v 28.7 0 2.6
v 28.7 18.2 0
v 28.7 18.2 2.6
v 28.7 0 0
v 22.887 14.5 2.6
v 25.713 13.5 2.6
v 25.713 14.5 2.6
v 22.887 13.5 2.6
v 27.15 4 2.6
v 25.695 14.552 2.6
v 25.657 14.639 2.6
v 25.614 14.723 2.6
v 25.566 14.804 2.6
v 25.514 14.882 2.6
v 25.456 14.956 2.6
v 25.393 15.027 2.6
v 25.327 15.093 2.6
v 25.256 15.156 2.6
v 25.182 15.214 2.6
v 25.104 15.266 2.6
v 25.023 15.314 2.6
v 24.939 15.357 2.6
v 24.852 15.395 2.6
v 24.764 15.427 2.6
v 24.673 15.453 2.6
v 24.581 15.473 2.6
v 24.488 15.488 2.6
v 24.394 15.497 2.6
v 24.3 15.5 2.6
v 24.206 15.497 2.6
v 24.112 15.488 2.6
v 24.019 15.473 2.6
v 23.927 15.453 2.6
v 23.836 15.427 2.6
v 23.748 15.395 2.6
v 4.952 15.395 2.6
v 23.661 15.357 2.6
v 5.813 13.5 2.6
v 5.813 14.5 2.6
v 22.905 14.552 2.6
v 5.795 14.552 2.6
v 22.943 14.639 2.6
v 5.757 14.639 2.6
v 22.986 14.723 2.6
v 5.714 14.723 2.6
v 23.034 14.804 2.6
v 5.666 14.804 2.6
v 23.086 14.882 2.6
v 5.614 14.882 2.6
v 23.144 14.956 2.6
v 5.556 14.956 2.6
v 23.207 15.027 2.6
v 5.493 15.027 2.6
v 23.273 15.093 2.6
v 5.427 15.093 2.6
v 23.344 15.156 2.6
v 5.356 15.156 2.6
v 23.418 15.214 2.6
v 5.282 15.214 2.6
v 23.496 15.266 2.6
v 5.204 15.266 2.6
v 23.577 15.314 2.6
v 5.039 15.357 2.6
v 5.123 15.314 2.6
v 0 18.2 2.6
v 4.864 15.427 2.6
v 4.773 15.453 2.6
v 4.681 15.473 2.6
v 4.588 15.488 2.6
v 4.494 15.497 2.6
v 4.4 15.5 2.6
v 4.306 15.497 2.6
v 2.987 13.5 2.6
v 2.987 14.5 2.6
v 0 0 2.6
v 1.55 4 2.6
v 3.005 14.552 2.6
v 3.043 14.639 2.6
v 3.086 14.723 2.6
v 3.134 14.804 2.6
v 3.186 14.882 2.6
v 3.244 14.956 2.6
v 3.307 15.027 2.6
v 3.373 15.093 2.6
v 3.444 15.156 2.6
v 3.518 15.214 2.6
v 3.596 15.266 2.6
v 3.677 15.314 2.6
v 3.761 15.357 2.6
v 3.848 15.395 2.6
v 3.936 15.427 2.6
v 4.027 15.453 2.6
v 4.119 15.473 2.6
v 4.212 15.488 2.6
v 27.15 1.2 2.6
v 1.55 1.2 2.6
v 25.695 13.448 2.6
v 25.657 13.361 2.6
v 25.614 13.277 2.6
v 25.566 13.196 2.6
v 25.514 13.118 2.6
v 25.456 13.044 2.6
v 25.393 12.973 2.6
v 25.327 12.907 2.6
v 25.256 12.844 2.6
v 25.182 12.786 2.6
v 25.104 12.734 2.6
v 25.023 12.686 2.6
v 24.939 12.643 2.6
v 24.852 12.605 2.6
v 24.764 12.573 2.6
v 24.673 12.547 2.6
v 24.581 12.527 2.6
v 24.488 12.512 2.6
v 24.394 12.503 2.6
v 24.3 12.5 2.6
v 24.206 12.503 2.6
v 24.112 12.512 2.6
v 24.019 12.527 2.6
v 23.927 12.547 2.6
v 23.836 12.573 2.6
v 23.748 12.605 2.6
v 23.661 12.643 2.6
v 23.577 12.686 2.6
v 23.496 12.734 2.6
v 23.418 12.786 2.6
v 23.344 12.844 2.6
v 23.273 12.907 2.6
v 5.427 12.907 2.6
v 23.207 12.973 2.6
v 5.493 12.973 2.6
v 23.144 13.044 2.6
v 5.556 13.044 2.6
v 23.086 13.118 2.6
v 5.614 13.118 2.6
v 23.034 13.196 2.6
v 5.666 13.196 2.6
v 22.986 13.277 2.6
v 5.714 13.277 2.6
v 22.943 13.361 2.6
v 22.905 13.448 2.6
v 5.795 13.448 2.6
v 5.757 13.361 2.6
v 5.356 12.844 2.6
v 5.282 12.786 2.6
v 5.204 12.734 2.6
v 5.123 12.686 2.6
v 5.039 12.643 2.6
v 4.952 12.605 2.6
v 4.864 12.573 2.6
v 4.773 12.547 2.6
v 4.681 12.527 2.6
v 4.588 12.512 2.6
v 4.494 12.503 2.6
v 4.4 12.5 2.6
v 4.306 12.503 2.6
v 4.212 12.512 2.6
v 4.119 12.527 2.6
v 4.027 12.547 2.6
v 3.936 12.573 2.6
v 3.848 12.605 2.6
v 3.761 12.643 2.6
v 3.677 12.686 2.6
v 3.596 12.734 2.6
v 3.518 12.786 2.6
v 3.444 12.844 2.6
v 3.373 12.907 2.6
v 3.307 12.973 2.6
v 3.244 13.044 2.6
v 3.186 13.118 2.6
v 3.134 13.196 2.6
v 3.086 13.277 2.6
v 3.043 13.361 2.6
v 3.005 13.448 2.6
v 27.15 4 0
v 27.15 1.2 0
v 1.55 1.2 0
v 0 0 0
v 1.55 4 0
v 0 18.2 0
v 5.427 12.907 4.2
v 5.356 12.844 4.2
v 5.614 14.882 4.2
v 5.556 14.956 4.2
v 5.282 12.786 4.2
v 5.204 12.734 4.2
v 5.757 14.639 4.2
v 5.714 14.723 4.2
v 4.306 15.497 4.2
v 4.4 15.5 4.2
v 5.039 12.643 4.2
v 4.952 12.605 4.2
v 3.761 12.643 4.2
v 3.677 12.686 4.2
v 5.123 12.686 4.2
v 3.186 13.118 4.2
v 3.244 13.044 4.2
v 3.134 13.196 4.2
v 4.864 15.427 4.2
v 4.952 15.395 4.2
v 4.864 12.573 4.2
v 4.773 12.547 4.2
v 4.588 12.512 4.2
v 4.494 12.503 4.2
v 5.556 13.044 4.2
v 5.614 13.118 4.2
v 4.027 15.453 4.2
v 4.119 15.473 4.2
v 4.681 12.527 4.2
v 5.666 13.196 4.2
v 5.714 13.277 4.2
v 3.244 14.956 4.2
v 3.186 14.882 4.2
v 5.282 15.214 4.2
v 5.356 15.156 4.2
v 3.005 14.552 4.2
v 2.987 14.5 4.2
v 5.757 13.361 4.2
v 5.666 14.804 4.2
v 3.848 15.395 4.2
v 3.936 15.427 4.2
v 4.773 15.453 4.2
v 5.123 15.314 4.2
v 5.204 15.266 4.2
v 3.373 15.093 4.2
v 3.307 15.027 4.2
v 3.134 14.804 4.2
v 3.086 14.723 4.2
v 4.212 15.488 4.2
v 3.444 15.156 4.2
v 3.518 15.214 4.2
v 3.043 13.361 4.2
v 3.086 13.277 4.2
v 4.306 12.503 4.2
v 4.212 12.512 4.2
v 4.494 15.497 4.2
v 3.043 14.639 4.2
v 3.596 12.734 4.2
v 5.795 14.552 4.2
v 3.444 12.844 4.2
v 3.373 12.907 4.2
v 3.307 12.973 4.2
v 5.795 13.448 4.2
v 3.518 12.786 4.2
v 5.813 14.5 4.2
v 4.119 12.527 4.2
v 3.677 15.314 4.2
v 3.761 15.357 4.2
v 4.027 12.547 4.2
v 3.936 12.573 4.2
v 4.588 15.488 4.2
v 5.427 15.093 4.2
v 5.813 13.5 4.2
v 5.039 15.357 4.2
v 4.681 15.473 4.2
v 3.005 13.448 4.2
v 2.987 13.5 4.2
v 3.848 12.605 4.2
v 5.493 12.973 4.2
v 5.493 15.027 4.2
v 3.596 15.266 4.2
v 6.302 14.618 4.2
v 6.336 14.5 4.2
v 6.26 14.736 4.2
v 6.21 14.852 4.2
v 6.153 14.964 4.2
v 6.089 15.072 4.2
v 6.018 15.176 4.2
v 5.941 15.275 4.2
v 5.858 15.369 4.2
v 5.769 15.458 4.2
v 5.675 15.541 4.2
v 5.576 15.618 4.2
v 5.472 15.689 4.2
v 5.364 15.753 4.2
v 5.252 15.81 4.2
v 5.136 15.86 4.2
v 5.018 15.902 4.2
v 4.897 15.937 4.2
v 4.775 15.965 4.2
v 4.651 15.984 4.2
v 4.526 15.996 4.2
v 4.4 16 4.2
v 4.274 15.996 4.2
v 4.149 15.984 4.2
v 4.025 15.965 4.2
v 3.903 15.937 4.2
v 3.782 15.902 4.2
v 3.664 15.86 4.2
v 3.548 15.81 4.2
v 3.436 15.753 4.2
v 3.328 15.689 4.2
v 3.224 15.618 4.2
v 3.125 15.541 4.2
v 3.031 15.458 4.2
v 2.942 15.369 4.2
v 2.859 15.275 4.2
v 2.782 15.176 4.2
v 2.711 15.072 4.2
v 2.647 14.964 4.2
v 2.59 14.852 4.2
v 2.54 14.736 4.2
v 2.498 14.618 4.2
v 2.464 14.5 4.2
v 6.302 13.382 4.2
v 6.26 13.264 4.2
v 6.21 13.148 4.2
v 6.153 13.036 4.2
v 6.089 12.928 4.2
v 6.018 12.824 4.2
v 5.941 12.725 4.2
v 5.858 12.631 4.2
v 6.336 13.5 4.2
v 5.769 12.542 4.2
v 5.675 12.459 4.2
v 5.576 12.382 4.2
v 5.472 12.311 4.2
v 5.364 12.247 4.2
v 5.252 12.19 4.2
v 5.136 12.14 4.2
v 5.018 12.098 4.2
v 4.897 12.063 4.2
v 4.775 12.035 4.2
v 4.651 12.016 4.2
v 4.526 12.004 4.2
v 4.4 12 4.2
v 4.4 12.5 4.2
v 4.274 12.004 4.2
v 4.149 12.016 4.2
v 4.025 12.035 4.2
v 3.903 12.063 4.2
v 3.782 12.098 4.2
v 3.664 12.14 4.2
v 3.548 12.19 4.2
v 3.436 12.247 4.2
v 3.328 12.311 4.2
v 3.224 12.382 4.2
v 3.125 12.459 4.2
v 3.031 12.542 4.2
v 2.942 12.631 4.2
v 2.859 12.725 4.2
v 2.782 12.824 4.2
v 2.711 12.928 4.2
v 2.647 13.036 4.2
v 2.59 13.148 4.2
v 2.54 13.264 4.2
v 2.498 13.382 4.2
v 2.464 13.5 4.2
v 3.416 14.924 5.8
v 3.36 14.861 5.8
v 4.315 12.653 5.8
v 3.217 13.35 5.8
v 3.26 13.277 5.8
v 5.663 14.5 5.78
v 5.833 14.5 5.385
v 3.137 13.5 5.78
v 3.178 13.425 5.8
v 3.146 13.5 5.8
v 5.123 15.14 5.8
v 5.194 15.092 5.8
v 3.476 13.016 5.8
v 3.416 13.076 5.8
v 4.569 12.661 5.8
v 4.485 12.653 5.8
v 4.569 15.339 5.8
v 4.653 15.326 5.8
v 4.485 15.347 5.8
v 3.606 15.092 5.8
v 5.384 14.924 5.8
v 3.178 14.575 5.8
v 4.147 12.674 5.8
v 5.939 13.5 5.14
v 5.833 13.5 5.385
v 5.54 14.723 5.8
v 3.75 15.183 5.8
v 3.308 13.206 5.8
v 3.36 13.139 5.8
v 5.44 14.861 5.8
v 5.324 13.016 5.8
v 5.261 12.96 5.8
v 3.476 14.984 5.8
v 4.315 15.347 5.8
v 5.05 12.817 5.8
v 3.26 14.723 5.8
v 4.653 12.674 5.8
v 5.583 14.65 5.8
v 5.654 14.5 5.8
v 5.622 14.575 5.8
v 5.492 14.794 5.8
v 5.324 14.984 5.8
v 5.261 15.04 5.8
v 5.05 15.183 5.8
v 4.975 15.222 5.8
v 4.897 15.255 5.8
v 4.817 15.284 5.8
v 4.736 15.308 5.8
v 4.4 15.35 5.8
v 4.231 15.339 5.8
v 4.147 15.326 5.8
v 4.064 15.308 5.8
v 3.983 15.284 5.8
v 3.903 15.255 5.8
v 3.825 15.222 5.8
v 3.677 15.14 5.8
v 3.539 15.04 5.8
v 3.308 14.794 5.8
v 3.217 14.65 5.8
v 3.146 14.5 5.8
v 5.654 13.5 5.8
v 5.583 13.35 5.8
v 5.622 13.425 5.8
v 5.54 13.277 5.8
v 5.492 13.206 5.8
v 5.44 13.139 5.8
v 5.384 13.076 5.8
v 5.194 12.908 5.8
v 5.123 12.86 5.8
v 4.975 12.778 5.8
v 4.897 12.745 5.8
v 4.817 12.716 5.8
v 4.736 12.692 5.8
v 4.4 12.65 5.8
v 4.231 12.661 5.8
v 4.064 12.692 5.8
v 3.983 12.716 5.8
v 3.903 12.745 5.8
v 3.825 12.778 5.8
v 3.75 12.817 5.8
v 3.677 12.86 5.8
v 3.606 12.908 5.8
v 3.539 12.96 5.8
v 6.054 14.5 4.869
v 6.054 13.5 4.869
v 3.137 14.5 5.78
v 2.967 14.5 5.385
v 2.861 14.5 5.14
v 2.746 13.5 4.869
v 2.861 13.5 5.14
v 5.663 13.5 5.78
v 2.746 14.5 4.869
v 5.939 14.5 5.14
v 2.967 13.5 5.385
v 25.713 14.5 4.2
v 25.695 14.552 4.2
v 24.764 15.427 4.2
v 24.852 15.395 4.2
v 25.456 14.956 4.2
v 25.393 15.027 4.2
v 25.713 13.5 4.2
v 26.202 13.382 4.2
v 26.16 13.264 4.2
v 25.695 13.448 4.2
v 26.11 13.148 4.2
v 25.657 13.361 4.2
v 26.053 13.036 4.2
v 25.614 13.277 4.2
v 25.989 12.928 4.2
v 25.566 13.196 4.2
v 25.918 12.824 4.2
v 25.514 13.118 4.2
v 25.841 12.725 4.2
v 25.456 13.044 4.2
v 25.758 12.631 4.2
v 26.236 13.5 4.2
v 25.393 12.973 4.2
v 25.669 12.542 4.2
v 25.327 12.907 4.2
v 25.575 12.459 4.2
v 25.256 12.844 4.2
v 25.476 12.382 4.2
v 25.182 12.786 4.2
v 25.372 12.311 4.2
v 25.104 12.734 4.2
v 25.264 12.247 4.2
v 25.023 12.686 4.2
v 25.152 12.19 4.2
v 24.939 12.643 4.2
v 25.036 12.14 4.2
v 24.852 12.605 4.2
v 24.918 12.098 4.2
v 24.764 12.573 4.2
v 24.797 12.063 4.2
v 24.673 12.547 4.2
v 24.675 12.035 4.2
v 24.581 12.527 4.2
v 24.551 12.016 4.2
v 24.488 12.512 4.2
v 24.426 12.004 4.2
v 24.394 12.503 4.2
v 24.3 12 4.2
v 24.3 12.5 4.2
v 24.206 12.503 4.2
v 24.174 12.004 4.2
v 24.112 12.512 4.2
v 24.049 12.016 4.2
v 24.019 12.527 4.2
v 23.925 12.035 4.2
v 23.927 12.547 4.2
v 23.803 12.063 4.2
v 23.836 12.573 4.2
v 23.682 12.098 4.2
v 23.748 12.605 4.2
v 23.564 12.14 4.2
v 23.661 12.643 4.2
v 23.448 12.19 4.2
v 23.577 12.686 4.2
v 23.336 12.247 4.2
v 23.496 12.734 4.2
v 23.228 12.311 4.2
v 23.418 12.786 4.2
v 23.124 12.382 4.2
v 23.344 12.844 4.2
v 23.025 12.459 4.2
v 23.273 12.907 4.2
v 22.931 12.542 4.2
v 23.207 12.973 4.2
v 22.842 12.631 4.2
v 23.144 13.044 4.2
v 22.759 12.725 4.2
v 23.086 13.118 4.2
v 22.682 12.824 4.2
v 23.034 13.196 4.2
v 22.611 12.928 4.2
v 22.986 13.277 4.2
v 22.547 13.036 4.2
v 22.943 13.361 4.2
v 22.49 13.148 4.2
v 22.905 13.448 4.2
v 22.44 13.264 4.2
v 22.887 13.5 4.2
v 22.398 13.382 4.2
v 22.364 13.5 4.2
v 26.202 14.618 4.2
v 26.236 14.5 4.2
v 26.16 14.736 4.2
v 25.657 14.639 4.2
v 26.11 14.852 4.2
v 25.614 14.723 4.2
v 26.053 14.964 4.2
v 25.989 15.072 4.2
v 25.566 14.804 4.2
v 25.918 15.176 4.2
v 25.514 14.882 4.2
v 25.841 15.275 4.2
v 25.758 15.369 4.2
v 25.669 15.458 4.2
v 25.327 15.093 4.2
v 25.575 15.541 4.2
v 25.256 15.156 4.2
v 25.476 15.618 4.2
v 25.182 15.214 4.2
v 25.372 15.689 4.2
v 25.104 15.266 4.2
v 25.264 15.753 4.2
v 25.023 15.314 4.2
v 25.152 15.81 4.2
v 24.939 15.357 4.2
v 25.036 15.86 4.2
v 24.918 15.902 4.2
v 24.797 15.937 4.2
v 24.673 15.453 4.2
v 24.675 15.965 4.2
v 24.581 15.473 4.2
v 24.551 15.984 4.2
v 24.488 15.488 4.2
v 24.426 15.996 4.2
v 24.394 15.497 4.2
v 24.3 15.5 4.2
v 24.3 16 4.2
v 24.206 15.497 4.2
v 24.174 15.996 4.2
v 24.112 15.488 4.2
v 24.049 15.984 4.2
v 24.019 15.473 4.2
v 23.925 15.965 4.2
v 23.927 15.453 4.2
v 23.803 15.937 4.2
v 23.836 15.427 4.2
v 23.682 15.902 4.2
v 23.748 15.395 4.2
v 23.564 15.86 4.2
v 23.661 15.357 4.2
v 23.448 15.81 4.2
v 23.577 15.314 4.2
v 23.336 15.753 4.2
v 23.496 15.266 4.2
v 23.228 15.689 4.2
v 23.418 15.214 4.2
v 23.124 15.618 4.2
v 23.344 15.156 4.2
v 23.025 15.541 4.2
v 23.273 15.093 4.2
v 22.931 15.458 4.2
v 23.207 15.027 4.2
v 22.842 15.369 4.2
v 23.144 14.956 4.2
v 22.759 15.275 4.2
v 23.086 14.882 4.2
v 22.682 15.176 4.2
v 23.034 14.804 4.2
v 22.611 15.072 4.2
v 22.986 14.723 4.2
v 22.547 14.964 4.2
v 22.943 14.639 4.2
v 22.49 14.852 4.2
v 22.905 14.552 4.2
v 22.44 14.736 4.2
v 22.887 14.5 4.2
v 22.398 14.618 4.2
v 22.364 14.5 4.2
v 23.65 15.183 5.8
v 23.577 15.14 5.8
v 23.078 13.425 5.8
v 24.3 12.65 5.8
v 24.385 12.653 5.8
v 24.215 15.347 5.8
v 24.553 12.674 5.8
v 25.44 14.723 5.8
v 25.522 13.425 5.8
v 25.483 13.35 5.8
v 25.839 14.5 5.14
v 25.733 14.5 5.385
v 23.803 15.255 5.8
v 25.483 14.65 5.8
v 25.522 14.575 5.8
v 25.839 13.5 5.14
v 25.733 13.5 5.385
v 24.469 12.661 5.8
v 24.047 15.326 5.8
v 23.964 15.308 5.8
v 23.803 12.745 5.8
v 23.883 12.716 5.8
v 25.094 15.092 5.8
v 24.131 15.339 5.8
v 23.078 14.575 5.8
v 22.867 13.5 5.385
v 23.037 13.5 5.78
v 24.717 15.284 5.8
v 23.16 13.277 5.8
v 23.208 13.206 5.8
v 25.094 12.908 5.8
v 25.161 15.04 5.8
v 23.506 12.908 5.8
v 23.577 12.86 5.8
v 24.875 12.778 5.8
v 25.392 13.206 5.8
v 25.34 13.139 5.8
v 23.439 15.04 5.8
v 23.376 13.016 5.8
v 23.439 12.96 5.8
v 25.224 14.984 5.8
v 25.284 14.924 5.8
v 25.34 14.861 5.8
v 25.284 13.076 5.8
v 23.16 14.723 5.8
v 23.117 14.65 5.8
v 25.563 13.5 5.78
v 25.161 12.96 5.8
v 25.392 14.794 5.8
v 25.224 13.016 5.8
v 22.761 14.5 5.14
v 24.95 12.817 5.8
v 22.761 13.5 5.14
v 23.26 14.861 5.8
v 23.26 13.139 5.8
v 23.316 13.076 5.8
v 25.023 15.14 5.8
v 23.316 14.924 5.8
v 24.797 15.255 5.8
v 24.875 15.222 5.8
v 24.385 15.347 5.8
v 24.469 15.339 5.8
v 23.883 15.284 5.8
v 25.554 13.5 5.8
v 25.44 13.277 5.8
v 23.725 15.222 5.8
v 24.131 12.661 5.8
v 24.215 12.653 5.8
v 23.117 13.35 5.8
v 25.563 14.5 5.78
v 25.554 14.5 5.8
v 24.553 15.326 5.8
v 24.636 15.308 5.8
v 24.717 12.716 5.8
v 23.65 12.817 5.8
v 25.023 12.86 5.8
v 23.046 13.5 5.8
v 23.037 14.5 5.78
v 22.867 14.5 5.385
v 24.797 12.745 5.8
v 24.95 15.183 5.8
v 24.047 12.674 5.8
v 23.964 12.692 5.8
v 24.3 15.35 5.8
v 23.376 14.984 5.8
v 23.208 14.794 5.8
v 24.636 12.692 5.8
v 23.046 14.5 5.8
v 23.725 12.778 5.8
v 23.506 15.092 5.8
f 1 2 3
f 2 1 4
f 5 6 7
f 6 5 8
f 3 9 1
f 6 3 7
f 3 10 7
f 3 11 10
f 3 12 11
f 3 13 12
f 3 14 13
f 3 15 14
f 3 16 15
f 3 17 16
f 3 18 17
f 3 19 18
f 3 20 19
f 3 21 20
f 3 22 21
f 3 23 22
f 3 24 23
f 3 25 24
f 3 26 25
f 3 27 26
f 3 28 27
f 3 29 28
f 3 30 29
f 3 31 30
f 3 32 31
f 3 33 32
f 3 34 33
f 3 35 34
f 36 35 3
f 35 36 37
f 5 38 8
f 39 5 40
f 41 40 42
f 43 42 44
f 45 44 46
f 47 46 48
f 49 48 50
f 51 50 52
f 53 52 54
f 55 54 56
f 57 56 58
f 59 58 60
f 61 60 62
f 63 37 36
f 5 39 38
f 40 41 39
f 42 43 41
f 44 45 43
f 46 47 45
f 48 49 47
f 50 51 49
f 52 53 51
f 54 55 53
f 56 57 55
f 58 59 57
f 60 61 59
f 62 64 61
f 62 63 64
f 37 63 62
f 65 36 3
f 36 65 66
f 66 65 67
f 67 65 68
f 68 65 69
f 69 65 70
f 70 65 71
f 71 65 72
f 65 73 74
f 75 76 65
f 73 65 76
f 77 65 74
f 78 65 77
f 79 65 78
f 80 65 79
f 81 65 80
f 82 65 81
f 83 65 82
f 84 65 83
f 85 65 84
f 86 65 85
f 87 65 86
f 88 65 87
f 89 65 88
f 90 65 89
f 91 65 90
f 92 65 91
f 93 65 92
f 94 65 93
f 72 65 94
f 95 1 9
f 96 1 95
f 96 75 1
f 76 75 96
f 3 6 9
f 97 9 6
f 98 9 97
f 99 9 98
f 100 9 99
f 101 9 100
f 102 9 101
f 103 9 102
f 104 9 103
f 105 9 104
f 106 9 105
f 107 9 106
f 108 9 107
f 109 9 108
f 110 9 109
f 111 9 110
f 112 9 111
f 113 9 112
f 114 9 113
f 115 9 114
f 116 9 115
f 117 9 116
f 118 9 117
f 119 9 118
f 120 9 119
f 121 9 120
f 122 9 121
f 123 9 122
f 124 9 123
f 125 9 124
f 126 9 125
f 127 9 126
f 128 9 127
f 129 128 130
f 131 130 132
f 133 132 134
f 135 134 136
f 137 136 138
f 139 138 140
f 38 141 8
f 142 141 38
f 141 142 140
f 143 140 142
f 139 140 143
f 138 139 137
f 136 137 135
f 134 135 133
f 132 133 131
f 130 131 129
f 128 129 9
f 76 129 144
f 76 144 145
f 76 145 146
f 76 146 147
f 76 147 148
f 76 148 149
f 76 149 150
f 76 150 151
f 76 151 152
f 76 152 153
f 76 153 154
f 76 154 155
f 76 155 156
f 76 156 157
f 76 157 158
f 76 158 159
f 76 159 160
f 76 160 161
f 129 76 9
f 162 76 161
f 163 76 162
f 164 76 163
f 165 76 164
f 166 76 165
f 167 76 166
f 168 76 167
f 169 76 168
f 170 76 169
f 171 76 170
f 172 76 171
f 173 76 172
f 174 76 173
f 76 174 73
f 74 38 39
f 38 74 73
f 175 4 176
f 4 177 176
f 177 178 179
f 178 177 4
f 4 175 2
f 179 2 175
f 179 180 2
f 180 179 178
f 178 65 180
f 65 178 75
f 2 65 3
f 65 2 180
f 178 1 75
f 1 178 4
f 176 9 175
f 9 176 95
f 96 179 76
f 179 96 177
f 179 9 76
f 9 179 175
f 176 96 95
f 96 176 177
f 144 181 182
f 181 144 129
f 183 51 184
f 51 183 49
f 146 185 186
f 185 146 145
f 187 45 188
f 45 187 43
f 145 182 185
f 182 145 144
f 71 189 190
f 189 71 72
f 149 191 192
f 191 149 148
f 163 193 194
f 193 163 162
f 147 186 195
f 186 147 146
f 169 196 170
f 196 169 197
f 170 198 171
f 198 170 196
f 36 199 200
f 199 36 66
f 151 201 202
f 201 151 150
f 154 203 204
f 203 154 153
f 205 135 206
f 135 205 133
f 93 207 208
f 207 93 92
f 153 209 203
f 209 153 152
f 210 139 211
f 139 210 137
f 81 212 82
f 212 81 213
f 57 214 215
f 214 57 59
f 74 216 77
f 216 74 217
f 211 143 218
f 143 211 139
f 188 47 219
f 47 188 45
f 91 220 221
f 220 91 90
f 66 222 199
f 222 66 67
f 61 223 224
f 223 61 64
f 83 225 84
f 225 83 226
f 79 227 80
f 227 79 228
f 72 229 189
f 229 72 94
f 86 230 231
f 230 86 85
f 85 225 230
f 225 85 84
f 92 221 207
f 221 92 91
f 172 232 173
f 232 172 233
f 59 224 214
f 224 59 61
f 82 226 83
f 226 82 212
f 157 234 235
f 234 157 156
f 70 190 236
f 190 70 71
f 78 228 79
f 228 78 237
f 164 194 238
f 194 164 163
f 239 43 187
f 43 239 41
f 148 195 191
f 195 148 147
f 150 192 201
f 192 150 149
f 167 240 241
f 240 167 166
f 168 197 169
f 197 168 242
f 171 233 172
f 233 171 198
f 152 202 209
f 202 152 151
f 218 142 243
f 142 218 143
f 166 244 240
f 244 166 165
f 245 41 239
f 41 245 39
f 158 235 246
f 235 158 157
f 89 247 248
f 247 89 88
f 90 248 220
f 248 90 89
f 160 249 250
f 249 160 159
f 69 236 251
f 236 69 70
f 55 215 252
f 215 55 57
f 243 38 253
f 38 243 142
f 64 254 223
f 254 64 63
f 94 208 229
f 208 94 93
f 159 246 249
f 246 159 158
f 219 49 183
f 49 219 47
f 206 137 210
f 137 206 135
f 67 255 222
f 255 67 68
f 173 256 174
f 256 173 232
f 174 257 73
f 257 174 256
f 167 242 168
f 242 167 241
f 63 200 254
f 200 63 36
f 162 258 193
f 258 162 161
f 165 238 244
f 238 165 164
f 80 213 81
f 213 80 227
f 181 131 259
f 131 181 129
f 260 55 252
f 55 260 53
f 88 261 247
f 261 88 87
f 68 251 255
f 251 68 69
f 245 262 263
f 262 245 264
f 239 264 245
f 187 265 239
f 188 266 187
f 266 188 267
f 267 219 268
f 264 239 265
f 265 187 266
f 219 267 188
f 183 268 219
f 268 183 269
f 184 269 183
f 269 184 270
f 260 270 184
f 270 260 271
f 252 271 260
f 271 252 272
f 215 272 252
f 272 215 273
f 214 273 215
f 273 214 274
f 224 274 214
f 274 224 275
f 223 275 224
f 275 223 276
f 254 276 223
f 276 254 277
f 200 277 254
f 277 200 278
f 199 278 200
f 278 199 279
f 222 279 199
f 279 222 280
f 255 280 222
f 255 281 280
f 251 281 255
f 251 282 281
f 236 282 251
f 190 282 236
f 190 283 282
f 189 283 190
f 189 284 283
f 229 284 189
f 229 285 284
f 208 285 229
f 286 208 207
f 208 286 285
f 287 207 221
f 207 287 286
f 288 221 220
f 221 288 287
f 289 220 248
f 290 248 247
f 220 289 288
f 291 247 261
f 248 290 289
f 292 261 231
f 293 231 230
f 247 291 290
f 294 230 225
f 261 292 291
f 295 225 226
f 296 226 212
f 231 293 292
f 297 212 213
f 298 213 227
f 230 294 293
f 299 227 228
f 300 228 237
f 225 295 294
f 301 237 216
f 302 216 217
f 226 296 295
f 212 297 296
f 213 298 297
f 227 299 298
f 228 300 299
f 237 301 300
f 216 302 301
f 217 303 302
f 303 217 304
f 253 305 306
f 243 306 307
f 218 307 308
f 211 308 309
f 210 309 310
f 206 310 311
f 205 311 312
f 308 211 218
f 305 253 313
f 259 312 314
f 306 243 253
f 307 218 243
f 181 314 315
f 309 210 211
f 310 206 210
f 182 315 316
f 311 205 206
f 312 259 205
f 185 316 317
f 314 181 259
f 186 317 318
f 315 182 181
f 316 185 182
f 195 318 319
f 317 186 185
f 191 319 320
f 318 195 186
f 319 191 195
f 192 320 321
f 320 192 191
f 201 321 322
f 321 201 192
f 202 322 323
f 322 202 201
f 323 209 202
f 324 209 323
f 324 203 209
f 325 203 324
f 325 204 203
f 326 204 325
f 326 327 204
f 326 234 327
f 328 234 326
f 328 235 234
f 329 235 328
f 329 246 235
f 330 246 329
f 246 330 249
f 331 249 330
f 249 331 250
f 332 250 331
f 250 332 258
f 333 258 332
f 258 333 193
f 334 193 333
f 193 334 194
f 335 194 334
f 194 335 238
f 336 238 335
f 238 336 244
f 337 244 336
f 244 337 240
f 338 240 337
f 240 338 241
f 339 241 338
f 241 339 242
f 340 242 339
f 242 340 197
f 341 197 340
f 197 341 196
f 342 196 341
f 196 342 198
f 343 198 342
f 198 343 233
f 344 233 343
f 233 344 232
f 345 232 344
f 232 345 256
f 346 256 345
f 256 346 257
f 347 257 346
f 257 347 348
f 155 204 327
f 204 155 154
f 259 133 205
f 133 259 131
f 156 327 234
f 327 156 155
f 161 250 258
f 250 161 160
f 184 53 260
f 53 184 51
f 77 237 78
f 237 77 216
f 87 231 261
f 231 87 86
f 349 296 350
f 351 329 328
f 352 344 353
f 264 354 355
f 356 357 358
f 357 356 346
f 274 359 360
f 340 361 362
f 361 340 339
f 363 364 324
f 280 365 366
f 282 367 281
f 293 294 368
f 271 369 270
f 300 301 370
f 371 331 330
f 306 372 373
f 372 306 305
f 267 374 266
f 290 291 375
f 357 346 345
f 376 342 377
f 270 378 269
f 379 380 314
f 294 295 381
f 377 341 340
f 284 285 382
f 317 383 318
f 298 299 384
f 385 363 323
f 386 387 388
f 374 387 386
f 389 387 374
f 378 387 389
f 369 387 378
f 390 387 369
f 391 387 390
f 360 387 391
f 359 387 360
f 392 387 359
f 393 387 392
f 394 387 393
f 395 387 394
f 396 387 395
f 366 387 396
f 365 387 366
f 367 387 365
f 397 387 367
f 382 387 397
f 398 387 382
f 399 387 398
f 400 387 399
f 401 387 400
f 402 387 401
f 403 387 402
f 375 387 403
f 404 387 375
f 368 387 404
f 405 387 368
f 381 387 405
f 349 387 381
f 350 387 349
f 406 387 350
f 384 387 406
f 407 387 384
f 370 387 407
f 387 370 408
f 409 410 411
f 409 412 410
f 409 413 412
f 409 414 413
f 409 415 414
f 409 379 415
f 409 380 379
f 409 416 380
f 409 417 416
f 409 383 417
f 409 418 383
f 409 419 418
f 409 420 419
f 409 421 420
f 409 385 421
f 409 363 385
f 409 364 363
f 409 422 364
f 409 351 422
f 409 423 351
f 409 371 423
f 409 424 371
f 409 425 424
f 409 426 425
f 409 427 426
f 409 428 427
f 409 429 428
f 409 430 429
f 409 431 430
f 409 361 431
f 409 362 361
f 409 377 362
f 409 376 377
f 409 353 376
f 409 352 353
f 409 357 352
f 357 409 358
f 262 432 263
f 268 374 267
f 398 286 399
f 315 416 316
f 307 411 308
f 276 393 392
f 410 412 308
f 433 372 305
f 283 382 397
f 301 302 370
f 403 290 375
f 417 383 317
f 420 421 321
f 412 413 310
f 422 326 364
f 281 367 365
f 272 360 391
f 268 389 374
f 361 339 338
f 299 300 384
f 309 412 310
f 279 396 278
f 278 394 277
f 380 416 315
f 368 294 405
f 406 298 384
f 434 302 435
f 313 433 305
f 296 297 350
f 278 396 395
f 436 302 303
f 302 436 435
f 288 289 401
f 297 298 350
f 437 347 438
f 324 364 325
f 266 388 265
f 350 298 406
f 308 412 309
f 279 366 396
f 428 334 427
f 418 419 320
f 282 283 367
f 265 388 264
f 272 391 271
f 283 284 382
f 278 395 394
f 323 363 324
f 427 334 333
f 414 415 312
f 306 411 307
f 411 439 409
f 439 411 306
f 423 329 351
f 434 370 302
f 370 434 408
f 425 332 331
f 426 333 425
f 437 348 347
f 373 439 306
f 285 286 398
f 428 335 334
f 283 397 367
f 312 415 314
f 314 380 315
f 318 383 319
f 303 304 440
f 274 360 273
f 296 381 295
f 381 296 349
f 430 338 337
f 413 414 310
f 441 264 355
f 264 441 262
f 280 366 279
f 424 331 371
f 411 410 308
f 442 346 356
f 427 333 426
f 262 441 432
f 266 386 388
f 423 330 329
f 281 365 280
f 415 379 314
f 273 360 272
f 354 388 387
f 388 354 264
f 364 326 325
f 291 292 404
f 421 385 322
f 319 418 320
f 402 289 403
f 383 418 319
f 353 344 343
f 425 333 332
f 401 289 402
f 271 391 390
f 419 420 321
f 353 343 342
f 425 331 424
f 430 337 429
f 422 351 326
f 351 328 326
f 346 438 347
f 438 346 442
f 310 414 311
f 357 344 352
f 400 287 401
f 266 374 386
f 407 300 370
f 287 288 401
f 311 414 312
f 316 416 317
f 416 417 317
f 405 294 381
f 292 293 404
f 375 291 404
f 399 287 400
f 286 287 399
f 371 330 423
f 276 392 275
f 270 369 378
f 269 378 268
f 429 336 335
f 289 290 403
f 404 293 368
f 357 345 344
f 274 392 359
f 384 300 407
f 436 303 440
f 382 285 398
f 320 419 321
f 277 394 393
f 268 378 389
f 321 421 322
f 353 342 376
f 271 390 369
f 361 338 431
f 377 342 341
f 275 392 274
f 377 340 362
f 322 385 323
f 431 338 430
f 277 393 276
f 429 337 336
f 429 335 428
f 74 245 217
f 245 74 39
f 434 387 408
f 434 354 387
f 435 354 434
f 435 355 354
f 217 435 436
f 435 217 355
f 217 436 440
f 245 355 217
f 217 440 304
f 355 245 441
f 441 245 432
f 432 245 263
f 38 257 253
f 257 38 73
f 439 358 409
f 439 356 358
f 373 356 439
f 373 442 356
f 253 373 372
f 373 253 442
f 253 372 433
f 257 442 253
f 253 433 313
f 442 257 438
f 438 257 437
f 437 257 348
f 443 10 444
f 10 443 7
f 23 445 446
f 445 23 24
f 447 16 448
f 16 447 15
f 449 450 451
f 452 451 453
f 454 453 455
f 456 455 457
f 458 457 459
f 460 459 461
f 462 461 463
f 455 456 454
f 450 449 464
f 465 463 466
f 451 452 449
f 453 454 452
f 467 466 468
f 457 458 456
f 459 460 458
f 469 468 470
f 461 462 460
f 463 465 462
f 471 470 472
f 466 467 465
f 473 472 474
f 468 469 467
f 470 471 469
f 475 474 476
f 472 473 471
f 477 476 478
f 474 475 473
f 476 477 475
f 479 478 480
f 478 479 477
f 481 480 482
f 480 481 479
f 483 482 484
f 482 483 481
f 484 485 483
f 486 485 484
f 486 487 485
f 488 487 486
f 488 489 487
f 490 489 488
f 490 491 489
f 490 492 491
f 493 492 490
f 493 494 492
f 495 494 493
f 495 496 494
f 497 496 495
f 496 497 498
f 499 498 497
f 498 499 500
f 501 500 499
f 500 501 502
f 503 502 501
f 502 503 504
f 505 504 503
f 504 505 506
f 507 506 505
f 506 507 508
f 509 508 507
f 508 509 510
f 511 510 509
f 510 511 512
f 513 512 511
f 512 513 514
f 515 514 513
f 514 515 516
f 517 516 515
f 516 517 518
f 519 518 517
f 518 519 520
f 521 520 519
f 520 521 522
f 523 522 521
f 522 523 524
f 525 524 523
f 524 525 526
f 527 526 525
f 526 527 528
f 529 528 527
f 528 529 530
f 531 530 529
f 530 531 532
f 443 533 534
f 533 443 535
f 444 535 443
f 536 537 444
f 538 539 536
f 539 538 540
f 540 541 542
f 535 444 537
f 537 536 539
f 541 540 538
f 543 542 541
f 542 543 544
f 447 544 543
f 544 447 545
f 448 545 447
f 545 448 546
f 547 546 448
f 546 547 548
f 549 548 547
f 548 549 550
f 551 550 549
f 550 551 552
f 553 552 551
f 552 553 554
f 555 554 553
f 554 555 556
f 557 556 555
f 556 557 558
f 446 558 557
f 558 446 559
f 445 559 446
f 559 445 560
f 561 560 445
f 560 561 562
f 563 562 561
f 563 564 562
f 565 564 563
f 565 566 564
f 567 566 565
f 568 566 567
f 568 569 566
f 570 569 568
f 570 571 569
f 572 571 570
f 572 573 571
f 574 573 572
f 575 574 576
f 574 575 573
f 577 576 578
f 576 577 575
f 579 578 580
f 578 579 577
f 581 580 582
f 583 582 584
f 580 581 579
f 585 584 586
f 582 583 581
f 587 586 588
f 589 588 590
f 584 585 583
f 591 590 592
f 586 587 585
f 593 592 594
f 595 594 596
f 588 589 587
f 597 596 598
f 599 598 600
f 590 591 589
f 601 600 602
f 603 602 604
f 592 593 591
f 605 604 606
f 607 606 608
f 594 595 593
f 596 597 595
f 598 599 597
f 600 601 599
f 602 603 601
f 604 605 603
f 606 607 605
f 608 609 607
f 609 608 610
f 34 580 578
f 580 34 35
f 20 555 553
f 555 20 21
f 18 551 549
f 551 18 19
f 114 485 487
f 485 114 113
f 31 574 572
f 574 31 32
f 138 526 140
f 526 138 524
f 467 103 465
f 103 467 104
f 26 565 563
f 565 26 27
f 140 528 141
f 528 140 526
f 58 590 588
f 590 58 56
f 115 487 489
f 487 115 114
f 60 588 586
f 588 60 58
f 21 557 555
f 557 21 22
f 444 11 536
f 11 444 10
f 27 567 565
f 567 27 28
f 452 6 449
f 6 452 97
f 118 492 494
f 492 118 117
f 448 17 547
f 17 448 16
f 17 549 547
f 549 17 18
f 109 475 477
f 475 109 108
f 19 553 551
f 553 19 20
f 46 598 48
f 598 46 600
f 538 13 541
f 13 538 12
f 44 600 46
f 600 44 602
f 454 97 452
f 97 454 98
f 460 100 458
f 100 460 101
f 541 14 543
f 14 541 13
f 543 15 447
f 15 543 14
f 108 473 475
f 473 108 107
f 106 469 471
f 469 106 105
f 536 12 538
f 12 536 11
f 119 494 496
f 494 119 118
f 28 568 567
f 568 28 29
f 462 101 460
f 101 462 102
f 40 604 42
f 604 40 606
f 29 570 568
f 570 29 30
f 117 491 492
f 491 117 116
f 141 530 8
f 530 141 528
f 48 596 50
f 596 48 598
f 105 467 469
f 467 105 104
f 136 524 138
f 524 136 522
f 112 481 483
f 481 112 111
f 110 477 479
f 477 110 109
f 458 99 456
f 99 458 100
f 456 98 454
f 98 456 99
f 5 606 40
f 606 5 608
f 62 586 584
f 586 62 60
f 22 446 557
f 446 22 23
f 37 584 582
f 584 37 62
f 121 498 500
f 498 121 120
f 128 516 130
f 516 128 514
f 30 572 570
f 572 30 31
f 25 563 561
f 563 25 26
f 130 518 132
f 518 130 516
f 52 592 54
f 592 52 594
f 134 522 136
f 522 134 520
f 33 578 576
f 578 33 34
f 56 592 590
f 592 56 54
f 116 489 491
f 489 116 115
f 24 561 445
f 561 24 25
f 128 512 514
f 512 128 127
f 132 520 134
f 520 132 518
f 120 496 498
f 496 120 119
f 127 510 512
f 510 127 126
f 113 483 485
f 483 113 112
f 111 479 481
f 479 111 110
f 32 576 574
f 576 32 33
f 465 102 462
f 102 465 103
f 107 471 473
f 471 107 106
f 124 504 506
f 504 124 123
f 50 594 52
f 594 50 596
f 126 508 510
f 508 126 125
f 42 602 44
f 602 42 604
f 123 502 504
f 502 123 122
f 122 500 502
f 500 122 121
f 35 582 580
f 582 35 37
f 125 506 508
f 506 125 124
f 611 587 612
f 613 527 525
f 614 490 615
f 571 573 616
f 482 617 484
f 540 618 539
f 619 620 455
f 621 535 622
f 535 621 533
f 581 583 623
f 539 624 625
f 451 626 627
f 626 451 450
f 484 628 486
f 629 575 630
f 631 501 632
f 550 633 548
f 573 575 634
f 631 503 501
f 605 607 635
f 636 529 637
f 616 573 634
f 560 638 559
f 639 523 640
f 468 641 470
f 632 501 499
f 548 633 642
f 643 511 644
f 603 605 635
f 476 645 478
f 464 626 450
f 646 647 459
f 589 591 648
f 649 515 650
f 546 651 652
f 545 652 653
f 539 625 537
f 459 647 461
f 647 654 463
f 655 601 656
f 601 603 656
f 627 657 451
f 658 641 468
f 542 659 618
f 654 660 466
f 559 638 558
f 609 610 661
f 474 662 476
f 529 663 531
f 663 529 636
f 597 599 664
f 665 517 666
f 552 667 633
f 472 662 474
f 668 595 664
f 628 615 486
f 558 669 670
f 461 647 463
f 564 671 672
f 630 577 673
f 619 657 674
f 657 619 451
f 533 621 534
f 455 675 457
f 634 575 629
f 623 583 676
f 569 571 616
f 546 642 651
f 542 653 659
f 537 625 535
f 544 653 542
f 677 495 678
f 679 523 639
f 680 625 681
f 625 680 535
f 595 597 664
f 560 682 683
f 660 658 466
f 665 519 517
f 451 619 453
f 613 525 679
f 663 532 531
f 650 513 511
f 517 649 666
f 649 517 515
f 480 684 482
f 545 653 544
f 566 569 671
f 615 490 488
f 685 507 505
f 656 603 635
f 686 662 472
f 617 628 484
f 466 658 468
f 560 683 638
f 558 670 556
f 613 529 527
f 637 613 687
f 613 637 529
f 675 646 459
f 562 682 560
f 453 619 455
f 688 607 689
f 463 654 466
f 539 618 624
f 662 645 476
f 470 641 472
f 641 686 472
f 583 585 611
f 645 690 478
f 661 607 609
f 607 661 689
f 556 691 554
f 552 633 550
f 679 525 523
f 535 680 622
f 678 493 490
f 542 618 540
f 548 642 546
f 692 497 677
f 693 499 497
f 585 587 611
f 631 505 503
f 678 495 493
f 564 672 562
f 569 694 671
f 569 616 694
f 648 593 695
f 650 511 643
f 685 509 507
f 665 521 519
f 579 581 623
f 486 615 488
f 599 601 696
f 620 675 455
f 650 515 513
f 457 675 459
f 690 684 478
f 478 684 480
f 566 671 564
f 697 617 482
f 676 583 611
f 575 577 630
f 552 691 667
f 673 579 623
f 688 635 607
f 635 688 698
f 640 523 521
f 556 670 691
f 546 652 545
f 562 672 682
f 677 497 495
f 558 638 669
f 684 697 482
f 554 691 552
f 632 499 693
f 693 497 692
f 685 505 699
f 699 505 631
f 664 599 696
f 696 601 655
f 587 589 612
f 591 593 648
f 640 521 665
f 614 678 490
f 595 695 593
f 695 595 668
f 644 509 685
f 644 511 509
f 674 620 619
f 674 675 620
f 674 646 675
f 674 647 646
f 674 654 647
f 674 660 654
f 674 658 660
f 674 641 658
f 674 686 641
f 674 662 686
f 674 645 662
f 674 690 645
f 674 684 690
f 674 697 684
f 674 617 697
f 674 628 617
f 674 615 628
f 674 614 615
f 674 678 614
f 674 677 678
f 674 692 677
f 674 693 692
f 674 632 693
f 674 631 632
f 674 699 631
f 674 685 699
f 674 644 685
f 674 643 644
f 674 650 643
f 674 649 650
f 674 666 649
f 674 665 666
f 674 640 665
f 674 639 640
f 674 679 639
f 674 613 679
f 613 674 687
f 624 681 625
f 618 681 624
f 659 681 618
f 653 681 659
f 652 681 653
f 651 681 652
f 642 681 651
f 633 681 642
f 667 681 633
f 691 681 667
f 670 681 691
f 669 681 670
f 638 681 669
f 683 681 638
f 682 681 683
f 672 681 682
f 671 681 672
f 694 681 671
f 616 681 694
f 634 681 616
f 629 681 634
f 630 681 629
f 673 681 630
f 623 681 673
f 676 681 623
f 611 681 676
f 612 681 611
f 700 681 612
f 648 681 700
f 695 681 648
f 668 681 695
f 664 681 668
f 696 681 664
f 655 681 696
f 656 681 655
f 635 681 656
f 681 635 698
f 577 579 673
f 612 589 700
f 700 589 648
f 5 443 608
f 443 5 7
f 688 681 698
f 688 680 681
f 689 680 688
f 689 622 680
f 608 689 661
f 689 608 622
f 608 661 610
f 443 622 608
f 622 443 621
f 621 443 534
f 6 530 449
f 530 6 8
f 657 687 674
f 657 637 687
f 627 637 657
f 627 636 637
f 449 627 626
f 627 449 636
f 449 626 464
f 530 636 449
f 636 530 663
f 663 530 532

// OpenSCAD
module mpu9250 (board_w = 26.1, board_d = 15.6) {
    padding = 2.6;
    pin_w = 25.1 + 0.5;
    r = 1.5;
    r_ofs_y = 11.4;
    r_ofs_x = 1.6;
    board_h = 1.6;

    plate_d = board_d + padding;
    plate_w = board_w + padding;
    center_w = plate_w / 2.0;

    pin_hole = center_w - (pin_w / 2.0);
    union () {
        // Plate with cut-out for pins
        difference() {
            cube([plate_w, plate_d, 2.6]);
            translate([pin_hole, padding - 1.4, -padding / 2.0])
                cube([pin_w, 2.6 + 0.2, 2.6 + padding]);
        }
        // Pegs
        difference() {
            union () {
                translate([r + padding / 2.0 + r_ofs_x, 11.4 + padding, 2.6]) {
                    cylinder(h = board_h, r1 = r, r2 = r, $fn = 100);
                }
                translate([r + padding / 2.0 + r_ofs_x, 11.4 + padding, 2.6 + board_h])
                    cylinder(h = board_h, r1 = r + 0.5, r2 = r * 0.9, $fn = 100);
            }
            translate([padding / 2.0 + r_ofs_x * 0.9 - 1.0, 11.4 + padding - 0.5, 2.6]) {
                cube([r * 2.2 + 2.0, 1.0, board_h + 2.6]);
            }
        }
        difference() {
            union() {
                translate([plate_w - r - padding / 2.0 - r_ofs_x, 11.4 + padding, 2.6])
                    cylinder(h = board_h, r1 = r, r2 = r, $fn = 100);
                translate([plate_w - r - padding / 2.0 - r_ofs_x, 11.4 + padding, 2.6 + board_h])
                    cylinder(h = board_h, r1 = r + 0.5, r2 = r * 0.9, $fn = 100);
            }
            translate([plate_w - padding / 2.0 - r_ofs_x - r * 2.1 - 1.0, 11.4 + padding - 0.5, 2.6]) {
                cube([r * 2.2 + 2.0, 1.0, board_h + 2.6]);
            }
        }
    }
    
}

mpu9250();
